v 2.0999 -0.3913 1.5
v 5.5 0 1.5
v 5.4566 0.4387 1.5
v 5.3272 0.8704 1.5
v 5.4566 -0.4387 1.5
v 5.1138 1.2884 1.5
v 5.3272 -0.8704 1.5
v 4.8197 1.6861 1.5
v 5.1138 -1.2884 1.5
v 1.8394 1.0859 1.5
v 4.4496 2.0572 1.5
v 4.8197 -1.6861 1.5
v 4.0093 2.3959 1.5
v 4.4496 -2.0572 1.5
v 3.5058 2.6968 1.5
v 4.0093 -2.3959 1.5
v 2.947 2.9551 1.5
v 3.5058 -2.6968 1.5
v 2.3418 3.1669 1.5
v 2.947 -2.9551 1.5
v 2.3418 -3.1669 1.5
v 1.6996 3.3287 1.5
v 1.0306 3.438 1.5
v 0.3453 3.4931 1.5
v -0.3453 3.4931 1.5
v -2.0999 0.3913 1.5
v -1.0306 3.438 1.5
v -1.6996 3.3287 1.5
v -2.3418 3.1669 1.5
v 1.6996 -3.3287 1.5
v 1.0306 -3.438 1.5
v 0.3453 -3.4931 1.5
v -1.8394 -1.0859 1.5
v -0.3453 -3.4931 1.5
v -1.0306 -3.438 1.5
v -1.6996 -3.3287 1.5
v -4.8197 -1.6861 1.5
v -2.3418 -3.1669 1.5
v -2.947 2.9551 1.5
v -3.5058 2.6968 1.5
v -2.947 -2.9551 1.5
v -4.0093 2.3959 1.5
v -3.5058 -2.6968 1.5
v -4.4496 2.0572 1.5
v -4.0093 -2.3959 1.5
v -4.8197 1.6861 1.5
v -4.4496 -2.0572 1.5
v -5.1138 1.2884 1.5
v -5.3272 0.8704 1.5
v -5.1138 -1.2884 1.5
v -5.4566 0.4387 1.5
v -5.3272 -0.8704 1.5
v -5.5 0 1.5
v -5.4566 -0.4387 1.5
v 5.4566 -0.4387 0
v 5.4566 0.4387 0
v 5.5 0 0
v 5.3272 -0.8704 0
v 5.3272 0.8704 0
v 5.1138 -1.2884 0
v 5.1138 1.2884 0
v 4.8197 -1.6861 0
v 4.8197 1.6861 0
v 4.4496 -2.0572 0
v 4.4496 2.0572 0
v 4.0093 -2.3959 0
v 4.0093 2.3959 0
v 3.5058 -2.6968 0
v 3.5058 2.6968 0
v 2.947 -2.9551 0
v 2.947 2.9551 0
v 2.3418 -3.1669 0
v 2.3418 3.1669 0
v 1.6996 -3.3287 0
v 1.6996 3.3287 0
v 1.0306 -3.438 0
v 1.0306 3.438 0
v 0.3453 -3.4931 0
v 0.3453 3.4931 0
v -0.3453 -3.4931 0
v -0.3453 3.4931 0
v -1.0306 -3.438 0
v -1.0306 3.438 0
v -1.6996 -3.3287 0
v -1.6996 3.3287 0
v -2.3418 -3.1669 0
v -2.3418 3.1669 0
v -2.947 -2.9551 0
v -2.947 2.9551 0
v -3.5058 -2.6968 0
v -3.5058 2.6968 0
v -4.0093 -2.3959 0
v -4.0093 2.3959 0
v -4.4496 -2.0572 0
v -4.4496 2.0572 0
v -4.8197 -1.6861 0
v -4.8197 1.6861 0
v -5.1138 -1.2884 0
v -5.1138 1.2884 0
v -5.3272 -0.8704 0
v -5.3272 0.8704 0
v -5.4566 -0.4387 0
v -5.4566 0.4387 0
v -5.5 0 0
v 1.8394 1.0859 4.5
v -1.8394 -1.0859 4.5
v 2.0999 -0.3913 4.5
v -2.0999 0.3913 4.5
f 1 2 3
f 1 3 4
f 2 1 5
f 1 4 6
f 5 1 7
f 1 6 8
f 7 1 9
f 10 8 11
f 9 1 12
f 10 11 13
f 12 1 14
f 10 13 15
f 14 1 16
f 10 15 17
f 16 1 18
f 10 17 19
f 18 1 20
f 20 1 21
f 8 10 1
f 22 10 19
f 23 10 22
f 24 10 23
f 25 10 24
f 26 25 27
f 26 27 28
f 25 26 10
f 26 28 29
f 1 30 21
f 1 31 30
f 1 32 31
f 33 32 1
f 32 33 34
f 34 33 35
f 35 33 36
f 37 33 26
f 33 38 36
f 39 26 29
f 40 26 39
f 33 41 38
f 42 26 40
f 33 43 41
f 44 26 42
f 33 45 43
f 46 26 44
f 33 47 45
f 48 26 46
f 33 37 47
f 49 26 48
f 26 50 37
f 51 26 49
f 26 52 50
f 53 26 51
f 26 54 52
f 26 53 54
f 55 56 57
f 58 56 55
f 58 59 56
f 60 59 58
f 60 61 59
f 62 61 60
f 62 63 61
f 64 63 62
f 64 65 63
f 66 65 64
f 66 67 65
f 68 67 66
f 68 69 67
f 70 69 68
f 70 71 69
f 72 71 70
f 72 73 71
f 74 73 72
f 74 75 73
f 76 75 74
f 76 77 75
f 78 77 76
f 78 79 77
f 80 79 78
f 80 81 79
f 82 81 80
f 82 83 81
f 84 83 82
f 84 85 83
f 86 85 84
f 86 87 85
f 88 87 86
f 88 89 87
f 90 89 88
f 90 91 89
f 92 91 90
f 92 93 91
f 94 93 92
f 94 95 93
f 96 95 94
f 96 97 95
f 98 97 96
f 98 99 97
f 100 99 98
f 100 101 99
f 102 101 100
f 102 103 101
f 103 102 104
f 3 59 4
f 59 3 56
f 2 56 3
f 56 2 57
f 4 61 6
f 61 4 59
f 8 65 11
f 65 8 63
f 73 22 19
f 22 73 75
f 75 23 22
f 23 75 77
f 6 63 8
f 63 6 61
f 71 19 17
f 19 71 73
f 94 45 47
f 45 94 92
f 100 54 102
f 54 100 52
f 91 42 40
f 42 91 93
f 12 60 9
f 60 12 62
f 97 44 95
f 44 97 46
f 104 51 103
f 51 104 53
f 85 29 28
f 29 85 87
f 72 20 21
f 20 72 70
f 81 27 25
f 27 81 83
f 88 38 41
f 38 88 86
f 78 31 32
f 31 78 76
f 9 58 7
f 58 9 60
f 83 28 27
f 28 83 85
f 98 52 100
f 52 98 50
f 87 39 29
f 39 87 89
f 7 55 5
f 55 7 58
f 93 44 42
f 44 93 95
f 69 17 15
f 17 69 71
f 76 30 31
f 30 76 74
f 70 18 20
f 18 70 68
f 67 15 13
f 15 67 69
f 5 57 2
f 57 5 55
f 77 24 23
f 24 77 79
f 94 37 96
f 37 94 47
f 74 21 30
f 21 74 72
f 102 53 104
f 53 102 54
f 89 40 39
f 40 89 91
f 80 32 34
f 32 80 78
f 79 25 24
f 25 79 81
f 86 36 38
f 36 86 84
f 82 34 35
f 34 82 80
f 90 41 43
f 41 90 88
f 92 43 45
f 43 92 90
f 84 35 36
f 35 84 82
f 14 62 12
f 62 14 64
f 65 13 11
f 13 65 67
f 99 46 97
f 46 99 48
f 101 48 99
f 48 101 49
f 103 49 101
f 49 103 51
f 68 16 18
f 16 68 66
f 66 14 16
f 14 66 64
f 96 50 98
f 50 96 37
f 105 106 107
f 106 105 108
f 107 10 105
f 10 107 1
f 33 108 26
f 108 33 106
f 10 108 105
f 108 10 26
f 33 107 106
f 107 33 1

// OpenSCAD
//Set resolution - best to leave at 200
$fn = 50; 

//Radius of pad (long)
l = 5.5; 

//Radius of pad (short)
w = 3.5; 

//Thickness of pad
t = 1.5; 

//Pin length
pl = 4; 

//Pin width
pw = 1.5; 

//Pin height
ph = 3; 

//Pin rotation (degrees)
pr = 10;

//Add oval module
module oval(w,h, height, center = false) { 
  scale([1, h/w, 1]) cylinder(h=height, r=w, center=center);
}



oval(l,w,t);
rotate([0,0,pr])
translate([-pl/2,-pw/2,0])
cube([pl,pw,ph+t]);
